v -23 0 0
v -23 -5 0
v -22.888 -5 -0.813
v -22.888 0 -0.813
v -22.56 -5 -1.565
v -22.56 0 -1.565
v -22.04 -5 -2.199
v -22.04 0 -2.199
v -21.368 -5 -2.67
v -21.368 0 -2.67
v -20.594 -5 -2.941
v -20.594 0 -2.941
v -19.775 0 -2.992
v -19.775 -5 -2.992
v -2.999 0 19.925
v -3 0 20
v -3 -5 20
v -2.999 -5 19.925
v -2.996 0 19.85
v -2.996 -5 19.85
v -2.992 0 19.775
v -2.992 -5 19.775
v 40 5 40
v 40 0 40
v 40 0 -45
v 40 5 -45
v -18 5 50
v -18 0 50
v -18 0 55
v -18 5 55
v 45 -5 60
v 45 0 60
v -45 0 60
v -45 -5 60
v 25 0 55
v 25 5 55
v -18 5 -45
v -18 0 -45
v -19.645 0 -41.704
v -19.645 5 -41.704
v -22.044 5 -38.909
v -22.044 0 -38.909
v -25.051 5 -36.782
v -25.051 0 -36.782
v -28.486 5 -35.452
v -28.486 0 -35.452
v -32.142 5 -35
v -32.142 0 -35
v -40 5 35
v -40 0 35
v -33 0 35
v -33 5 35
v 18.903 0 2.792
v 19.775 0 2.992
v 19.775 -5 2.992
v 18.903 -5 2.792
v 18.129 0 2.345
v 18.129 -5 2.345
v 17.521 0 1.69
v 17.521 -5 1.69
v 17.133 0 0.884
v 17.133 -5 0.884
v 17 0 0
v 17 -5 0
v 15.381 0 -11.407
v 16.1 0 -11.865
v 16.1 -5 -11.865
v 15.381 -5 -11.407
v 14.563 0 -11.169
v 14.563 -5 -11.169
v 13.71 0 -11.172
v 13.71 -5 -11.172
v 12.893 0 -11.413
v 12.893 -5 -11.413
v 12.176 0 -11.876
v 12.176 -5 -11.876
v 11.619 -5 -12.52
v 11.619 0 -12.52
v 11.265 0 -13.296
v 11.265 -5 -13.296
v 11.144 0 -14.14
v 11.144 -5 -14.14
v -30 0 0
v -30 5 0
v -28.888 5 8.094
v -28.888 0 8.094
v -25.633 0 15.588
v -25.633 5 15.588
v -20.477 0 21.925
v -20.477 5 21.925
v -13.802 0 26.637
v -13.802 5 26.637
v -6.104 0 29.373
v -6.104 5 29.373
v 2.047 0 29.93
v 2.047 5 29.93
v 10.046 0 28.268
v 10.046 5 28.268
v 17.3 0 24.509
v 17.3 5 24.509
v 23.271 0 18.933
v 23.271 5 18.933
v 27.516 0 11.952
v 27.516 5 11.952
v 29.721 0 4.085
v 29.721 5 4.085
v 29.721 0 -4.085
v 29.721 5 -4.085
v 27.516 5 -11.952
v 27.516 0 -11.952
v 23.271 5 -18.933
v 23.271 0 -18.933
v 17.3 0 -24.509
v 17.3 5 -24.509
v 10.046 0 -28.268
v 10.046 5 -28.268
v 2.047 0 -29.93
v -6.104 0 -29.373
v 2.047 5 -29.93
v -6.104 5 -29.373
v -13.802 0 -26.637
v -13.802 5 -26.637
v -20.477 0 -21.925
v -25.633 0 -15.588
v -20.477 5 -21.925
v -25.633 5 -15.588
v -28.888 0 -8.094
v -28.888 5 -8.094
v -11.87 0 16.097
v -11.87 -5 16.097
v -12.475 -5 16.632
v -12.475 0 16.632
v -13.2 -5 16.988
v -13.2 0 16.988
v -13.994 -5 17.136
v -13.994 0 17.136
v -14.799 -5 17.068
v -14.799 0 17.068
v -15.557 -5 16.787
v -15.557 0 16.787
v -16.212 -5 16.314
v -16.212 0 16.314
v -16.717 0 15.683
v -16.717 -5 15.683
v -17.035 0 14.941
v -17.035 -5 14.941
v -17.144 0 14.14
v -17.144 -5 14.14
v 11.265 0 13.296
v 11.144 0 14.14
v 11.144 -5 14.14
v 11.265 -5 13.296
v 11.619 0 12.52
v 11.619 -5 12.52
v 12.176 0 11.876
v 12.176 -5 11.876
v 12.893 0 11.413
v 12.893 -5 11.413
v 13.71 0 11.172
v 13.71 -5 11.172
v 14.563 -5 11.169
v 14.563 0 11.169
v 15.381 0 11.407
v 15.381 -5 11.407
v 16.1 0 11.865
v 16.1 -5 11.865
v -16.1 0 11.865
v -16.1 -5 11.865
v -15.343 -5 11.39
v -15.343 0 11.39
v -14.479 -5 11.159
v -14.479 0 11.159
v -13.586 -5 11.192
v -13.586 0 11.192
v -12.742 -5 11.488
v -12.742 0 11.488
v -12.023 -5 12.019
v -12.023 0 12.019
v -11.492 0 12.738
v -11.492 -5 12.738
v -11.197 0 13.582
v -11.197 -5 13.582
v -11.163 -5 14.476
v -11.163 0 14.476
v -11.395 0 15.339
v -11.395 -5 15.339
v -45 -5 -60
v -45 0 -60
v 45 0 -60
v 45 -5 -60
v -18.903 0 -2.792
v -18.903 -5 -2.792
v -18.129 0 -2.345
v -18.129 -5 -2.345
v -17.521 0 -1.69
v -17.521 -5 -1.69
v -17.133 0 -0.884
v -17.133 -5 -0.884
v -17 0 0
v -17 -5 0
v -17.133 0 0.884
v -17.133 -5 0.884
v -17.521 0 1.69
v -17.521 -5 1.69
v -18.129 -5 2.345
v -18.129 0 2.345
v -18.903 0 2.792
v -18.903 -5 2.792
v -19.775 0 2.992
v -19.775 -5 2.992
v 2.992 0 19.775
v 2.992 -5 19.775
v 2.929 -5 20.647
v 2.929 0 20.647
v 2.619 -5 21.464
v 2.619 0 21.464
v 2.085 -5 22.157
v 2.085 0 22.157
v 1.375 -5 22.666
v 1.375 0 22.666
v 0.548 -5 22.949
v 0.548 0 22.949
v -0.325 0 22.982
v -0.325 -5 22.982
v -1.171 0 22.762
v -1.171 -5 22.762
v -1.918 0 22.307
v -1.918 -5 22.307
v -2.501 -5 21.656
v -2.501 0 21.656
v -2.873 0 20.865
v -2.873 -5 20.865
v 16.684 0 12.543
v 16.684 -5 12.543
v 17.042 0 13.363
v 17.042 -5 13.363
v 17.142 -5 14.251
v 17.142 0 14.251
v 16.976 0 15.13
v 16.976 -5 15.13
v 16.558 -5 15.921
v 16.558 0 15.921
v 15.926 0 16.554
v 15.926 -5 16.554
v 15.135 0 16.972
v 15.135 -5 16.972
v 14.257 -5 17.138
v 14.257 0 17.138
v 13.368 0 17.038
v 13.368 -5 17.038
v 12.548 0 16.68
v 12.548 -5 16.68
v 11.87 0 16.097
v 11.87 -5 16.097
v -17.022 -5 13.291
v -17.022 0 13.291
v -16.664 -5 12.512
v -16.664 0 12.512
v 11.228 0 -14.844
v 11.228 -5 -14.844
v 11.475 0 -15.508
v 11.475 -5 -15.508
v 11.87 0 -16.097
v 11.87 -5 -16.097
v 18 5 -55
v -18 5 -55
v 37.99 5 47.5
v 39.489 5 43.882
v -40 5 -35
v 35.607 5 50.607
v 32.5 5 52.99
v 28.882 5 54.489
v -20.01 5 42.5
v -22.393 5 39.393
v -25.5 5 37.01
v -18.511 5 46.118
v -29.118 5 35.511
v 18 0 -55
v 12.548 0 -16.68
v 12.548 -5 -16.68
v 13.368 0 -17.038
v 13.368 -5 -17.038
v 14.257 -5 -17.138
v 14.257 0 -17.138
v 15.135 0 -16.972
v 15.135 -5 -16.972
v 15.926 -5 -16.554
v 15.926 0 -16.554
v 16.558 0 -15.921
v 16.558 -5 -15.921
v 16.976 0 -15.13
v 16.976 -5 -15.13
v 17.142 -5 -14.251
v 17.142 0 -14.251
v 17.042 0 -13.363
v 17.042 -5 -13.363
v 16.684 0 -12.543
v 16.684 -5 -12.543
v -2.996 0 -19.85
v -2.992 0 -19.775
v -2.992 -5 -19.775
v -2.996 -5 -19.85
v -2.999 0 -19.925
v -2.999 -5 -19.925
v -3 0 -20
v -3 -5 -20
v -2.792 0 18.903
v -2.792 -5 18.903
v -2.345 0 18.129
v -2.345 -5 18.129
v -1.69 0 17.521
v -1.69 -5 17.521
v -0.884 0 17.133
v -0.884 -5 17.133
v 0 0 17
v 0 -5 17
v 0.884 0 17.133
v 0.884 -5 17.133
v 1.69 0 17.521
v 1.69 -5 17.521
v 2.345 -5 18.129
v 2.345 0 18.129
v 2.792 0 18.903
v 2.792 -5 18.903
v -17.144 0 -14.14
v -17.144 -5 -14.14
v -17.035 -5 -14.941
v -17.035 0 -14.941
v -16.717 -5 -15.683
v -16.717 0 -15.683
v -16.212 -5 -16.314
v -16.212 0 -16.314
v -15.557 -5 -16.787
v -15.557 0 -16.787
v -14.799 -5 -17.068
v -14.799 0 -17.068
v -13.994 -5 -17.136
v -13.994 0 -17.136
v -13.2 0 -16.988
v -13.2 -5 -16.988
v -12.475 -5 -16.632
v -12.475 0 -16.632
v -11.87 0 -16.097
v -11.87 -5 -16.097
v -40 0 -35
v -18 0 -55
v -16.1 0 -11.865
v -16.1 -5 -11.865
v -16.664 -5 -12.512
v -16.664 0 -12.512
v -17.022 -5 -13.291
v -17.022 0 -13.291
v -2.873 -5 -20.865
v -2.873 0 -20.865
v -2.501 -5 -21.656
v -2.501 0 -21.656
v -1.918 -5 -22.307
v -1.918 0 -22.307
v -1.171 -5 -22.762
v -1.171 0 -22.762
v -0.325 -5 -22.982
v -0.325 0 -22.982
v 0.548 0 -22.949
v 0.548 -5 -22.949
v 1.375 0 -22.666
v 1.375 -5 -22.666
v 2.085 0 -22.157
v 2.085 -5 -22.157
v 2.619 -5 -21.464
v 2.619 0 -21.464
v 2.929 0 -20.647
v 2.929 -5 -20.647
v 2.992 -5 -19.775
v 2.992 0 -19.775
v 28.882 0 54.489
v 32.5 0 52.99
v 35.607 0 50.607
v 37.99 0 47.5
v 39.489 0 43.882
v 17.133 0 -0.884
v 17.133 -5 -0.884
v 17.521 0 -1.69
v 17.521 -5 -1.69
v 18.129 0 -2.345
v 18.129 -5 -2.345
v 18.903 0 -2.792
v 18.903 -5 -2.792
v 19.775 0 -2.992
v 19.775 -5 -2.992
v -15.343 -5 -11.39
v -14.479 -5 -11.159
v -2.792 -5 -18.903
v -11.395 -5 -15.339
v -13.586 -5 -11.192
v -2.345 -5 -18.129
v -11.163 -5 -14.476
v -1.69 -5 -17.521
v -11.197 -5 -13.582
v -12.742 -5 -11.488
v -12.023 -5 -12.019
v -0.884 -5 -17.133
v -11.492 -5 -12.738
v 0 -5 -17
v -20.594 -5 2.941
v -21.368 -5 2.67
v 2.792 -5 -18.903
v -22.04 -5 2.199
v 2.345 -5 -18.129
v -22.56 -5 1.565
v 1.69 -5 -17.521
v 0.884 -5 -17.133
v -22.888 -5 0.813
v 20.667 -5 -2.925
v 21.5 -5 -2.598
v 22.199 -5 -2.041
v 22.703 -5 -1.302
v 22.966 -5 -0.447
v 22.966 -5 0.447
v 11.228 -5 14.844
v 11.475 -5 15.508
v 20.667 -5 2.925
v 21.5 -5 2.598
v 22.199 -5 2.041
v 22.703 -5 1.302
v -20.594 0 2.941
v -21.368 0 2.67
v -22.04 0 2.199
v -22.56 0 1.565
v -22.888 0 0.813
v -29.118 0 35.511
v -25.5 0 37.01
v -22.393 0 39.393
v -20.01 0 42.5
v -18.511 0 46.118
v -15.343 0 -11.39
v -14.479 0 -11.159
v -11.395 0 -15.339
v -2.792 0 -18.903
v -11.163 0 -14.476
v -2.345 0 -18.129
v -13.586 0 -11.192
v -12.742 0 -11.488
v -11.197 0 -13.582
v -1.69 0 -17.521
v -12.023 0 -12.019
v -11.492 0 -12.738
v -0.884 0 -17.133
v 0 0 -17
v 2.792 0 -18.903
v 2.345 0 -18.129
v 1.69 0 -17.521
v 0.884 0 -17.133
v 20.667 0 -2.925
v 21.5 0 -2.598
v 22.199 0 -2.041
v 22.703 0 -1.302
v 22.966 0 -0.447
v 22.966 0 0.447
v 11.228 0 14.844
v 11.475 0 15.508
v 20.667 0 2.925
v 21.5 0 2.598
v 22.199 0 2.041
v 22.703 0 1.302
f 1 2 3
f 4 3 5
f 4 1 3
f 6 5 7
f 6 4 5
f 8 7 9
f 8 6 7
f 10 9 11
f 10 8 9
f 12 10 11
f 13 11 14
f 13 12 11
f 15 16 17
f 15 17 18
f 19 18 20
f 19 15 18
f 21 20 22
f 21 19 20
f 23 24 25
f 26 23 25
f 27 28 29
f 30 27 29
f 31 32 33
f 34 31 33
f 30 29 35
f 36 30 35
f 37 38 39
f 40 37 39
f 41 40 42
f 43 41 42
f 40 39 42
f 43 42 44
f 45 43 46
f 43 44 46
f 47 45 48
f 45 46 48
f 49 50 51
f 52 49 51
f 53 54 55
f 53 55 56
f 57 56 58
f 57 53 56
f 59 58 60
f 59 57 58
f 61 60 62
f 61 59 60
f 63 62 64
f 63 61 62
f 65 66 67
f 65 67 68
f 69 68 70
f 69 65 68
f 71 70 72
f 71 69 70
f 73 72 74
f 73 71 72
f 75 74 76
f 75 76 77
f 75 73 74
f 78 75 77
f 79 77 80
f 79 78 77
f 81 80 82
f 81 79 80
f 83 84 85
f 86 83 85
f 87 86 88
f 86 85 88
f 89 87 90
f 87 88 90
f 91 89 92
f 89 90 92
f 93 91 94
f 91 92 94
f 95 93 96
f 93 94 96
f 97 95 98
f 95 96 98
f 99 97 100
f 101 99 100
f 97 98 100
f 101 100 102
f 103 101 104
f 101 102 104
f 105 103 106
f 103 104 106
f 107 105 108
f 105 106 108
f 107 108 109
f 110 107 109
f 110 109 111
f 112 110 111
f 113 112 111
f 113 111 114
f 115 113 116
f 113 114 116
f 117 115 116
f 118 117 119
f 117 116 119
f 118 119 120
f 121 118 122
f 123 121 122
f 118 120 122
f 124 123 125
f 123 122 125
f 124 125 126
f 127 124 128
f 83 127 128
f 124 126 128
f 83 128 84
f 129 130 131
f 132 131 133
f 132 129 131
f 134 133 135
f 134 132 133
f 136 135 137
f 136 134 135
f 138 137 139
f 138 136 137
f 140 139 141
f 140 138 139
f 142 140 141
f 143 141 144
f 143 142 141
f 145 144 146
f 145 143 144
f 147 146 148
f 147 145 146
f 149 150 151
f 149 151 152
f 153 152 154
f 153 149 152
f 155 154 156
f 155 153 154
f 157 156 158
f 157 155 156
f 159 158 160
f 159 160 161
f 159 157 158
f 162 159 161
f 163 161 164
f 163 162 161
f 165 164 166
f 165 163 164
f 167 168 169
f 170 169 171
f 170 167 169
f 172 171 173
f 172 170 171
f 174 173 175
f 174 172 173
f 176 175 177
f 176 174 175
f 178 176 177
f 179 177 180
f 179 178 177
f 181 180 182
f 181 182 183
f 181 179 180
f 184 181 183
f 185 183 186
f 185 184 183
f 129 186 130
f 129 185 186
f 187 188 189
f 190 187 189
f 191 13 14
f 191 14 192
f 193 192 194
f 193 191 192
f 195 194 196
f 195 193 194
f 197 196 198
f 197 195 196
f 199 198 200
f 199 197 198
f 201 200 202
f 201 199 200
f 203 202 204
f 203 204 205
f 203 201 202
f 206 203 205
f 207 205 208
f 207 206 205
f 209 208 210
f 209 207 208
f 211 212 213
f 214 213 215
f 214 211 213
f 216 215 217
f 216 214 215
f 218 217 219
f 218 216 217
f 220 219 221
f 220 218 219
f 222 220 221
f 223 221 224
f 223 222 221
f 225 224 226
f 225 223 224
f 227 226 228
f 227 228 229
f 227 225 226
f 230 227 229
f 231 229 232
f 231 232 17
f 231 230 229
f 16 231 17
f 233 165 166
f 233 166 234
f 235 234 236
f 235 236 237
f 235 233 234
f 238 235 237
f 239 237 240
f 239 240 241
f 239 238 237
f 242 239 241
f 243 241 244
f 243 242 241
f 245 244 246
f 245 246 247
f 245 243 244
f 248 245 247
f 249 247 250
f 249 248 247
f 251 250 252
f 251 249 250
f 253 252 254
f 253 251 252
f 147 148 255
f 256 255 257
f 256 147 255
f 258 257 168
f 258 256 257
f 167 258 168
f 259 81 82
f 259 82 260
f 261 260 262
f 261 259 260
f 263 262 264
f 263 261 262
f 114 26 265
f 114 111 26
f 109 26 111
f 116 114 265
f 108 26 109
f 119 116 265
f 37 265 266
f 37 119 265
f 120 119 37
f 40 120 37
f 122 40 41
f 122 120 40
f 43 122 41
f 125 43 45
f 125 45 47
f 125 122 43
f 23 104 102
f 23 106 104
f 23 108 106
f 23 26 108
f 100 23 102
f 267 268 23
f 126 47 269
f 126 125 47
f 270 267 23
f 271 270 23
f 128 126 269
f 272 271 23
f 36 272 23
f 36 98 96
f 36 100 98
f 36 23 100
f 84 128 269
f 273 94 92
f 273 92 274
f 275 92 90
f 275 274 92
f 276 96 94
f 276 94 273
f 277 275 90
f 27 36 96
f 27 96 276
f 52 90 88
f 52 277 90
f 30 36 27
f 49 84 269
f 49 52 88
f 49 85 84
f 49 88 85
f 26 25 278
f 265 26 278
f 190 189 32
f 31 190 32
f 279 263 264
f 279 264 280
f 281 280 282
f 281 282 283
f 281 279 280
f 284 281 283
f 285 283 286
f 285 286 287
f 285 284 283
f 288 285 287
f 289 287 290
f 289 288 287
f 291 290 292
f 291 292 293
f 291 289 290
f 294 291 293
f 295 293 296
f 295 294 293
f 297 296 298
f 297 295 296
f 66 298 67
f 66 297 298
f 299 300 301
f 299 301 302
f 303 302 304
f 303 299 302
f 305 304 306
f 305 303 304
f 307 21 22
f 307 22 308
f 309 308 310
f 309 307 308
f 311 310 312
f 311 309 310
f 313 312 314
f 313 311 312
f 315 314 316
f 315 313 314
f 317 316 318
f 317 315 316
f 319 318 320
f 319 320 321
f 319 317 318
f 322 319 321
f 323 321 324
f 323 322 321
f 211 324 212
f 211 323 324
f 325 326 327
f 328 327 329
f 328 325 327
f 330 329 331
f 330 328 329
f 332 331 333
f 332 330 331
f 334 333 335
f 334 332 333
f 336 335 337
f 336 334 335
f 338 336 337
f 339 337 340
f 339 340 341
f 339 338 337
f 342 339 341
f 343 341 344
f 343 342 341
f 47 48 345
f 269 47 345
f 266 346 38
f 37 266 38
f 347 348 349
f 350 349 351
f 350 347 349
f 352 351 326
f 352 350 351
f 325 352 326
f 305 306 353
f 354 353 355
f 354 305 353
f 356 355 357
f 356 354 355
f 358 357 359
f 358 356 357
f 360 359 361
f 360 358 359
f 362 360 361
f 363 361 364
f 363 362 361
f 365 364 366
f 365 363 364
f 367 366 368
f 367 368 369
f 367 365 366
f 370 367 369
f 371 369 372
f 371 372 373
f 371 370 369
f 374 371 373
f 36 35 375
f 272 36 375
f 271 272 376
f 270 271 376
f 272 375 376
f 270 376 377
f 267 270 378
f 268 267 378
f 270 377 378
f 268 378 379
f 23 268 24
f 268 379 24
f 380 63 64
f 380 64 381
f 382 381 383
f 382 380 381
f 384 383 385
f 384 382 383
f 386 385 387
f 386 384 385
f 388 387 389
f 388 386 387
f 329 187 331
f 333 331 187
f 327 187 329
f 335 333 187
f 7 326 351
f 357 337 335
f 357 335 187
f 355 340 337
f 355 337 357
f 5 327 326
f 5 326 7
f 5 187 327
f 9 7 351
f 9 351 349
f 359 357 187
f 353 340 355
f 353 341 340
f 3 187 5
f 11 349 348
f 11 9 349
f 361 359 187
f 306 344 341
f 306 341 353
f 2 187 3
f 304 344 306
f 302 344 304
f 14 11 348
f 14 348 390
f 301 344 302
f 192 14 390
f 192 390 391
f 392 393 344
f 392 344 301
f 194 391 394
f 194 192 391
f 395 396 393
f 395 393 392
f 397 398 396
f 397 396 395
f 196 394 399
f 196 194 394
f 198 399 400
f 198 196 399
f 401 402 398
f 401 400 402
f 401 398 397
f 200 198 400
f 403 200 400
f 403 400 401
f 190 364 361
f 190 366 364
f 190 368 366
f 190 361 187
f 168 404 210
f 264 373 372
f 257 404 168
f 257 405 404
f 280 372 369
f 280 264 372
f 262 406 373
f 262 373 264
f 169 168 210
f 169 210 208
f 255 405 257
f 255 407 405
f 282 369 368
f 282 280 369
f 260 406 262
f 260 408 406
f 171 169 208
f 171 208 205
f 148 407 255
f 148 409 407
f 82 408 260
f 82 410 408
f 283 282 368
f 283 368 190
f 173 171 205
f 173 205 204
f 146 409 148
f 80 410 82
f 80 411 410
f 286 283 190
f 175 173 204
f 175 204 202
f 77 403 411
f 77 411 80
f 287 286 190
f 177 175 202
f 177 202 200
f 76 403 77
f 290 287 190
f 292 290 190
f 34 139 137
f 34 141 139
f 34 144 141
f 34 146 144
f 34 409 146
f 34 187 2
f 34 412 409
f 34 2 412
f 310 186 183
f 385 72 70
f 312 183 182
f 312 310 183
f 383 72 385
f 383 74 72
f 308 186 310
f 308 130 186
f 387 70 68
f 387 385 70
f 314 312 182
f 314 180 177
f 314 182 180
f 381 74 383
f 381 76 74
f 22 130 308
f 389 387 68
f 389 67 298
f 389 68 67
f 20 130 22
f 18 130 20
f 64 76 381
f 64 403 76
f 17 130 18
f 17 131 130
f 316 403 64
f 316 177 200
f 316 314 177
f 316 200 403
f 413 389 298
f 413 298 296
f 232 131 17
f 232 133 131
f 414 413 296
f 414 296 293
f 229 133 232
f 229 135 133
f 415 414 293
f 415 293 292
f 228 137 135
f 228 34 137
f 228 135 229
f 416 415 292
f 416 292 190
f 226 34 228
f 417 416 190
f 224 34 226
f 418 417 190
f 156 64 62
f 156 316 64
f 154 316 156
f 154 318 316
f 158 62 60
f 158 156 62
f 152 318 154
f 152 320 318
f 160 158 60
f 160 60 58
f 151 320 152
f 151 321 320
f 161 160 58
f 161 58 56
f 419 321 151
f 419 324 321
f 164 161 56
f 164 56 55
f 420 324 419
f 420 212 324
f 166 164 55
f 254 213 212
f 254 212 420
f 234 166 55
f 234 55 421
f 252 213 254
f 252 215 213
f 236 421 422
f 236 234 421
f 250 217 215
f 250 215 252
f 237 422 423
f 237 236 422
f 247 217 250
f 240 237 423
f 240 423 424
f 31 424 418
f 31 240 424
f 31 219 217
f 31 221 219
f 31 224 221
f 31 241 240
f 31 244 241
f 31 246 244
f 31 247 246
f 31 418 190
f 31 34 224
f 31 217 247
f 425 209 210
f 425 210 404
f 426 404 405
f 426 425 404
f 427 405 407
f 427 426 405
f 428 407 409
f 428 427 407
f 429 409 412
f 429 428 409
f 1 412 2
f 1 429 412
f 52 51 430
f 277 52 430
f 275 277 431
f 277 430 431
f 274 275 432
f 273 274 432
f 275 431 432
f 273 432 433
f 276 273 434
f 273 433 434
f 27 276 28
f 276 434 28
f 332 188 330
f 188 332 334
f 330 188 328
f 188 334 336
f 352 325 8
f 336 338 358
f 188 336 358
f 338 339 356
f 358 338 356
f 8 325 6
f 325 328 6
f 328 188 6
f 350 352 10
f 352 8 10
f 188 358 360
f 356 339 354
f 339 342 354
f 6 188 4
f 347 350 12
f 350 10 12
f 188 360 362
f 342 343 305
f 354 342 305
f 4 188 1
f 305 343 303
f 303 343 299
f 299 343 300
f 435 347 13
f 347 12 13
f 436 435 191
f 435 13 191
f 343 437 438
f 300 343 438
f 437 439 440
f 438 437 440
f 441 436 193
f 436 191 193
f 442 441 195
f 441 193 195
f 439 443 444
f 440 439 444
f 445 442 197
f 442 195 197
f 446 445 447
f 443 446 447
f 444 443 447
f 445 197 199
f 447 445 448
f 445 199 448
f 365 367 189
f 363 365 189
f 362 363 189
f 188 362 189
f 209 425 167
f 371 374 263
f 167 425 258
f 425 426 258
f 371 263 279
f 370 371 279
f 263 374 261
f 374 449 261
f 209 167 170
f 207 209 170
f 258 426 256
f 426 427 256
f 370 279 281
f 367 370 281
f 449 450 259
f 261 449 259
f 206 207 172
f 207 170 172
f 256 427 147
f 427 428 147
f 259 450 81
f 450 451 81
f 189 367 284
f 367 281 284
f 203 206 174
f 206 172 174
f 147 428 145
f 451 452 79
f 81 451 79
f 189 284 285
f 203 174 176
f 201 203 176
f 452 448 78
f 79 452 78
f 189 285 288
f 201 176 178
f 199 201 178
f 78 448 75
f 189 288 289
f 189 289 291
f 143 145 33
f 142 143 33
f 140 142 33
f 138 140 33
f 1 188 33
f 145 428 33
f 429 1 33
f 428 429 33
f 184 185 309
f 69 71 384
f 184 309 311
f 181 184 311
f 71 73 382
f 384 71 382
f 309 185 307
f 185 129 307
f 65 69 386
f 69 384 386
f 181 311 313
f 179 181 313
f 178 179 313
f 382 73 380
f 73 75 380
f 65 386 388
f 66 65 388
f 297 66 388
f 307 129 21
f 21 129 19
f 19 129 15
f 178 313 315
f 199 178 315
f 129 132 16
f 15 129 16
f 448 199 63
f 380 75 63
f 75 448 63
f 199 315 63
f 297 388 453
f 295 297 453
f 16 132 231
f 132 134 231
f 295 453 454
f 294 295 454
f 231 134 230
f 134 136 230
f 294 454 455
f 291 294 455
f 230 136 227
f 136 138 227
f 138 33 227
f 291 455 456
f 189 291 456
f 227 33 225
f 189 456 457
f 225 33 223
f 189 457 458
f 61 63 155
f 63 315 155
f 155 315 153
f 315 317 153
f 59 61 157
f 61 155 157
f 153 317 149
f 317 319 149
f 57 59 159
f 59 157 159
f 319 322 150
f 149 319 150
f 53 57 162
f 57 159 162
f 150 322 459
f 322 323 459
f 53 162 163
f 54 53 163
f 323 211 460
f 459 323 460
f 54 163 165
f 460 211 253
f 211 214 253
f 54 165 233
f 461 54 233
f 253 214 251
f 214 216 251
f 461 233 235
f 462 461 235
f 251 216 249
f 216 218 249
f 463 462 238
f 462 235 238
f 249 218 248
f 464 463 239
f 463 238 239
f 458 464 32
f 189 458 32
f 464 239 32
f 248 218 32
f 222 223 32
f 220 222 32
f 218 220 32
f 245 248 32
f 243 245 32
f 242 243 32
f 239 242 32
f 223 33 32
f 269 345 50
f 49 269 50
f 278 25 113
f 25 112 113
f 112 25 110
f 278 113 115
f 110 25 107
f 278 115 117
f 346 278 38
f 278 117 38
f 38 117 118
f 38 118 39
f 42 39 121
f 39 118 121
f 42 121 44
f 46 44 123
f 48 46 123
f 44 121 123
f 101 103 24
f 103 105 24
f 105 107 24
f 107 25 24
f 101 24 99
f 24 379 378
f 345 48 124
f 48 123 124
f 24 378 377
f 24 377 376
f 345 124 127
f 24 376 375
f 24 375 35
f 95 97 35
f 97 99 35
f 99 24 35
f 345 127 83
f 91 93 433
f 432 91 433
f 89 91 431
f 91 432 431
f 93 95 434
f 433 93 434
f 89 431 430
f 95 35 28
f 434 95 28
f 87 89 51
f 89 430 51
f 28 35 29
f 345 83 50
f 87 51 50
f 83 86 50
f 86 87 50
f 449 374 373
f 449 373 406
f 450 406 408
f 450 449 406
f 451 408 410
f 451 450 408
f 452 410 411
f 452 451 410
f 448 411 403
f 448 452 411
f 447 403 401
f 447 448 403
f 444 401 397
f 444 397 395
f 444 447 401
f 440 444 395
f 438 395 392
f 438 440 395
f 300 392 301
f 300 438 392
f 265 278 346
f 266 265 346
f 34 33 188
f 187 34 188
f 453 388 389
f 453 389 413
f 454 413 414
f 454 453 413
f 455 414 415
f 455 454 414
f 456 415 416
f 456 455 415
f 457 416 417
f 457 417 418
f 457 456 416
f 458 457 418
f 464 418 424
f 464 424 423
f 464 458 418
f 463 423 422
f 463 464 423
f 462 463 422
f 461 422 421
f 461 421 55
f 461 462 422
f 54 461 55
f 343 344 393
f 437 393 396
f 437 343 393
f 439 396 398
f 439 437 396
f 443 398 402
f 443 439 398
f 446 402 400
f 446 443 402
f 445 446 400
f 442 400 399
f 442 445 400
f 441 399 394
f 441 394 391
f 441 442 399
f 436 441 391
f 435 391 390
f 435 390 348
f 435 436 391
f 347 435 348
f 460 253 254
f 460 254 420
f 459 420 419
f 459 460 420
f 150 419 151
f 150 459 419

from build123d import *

# Parameters (mm, degrees)
F1_DEPTH = 5
F3_DEPTH = 5
F4_R     = 30
F5_DEPTH = 5
F6_DEPTH = 10


# Not quite as in the source:
# - a feature names something its author has since deleted; it is built from what else it names


with BuildPart() as f1:
    # F0 (on Front) → F1 (new body)
    with BuildSketch(Plane.XZ):
        Polygon((45, 60), (-45, 60), (-45, 0), (-45, -60), (0, -60), (45, -60), align=None)
    extrude(amount=F1_DEPTH)


with BuildPart() as f3:
    # F2 (on face) → F3 (new body)
    with BuildSketch(Plane(origin=(0, 0, 0), x_dir=(-1, 0, 0), z_dir=(0, 1, 0))):
        with BuildLine():
            Line((-40, -45), (-18, -55))
            Line((-18, -55), (18, -55))
            Line((18, -55), (18, -45))
            ThreePointArc((18, -45), (23.4818815859, -37.7525512861), (32.1421356237, -35))
            Line((32.1421356237, -35), (40, -35))
            Line((40, -35), (40, 35))
            Line((40, 35), (33, 35))
            ThreePointArc((33, 35), (22.3933982822, 39.3933982822), (18, 50))
            Line((18, 50), (18, 55))
            Line((18, 55), (-25, 55))
            ThreePointArc((-25, 55), (-35.6066017178, 50.6066017178), (-40, 40))
            Line((-40, 40), (-40, -45))
        make_face()
    extrude(amount=F3_DEPTH)

    # F4 (on face) → F5 (cut)
    with BuildSketch(Plane(origin=(0, 5, 0), x_dir=(-1, 0, 0), z_dir=(0, 1, 0))):
        Circle(F4_R)
        with BuildLine():
            ThreePointArc((16.1001741522, 11.8652598905), (18.4781684496, 7.6522735674), (19.775, 2.9915506013))
            ThreePointArc((19.775, 2.9915506013), (22.0402205763, 2.1994317448), (23, 0))
            ThreePointArc((23, 0), (22.0402205763, -2.1994317448), (19.775, -2.9915506013))
            ThreePointArc((19.775, -2.9915506013), (18.4781684496, -7.6522735674), (16.1001741522, -11.8652598905))
            ThreePointArc((16.1001741522, -11.8652598905), (16.8707805694, -12.8885427857), (17.144270925, -14.14))
            ThreePointArc((17.144270925, -14.14), (15.187715229, -16.9526898131), (11.870121602, -16.0965901095))
            ThreePointArc((11.870121602, -16.0965901095), (7.6550636836, -18.4770127456), (2.9915506013, -19.775))
            ThreePointArc((2.9915506013, -19.775), (2.9978869061, -19.8874207031), (3, -20))
            ThreePointArc((3, -20), (-0.1125792969, -22.9978869061), (-2.9915506013, -19.775))
            ThreePointArc((-2.9915506013, -19.775), (-7.6550636836, -18.4770127456), (-11.870121602, -16.0965901095))
            ThreePointArc((-11.870121602, -16.0965901095), (-16.2659115638, -16.261), (-16.1001741522, -11.8652598905))
            ThreePointArc((-16.1001741522, -11.8652598905), (-18.4781684496, -7.6522735674), (-19.775, -2.9915506013))
            ThreePointArc((-19.775, -2.9915506013), (-23, 0), (-19.775, 2.9915506013))
            ThreePointArc((-19.775, 2.9915506013), (-18.4781684496, 7.6522735674), (-16.1001741522, 11.8652598905))
            ThreePointArc((-16.1001741522, 11.8652598905), (-16.2659115638, 16.261), (-11.870121602, 16.0965901095))
            ThreePointArc((-11.870121602, 16.0965901095), (-7.6550636836, 18.4770127456), (-2.9915506013, 19.775))
            ThreePointArc((-2.9915506013, 19.775), (-0.1125792969, 22.9978869061), (3, 20))
            ThreePointArc((3, 20), (2.9978869061, 19.8874207031), (2.9915506013, 19.775))
            ThreePointArc((2.9915506013, 19.775), (7.6550636836, 18.4770127456), (11.870121602, 16.0965901095))
            ThreePointArc((11.870121602, 16.0965901095), (15.187715229, 16.9526898131), (17.144270925, 14.14))
            ThreePointArc((17.144270925, 14.14), (16.8707805694, 12.8885427857), (16.1001741522, 11.8652598905))
        make_face(mode=Mode.SUBTRACT)
        with BuildLine():
            ThreePointArc((19.775, -2.9915506013), (17, 0), (19.775, 2.9915506013))
            ThreePointArc((19.775, 2.9915506013), (18.4781684496, 7.6522735674), (16.1001741522, 11.8652598905))
            ThreePointArc((16.1001741522, 11.8652598905), (12.0226302863, 12.019), (11.870121602, 16.0965901095))
            ThreePointArc((11.870121602, 16.0965901095), (7.6550636836, 18.4770127456), (2.9915506013, 19.775))
            ThreePointArc((2.9915506013, 19.775), (0, 17), (-2.9915506013, 19.775))
            ThreePointArc((-2.9915506013, 19.775), (-7.6550636836, 18.4770127456), (-11.870121602, 16.0965901095))
            ThreePointArc((-11.870121602, 16.0965901095), (-11.3315811119, 15.183444304), (-11.144270925, 14.14))
            ThreePointArc((-11.144270925, 14.14), (-12.8928137107, 11.4134903556), (-16.1001741522, 11.8652598905))
            ThreePointArc((-16.1001741522, 11.8652598905), (-18.4781684496, 7.6522735674), (-19.775, 2.9915506013))
            ThreePointArc((-19.775, 2.9915506013), (-17.8005682552, 2.0402205763), (-17, 0))
            ThreePointArc((-17, 0), (-17.8005682552, -2.0402205763), (-19.775, -2.9915506013))
            ThreePointArc((-19.775, -2.9915506013), (-18.4781684496, -7.6522735674), (-16.1001741522, -11.8652598905))
            ThreePointArc((-16.1001741522, -11.8652598905), (-12.8928137107, -11.4134903556), (-11.144270925, -14.14))
            ThreePointArc((-11.144270925, -14.14), (-11.3315811119, -15.183444304), (-11.870121602, -16.0965901095))
            ThreePointArc((-11.870121602, -16.0965901095), (-7.6550636836, -18.4770127456), (-2.9915506013, -19.775))
            ThreePointArc((-2.9915506013, -19.775), (0, -17), (2.9915506013, -19.775))
            ThreePointArc((2.9915506013, -19.775), (7.6550636836, -18.4770127456), (11.870121602, -16.0965901095))
            ThreePointArc((11.870121602, -16.0965901095), (12.0226302863, -12.019), (16.1001741522, -11.8652598905))
            ThreePointArc((16.1001741522, -11.8652598905), (18.4781684496, -7.6522735674), (19.775, -2.9915506013))
        make_face()
    extrude(amount=-F5_DEPTH, mode=Mode.SUBTRACT)


with BuildPart() as f6_tool:
    # F6 (cut): faces of the model
    f6_faces = [f3.part.faces().sort_by_distance(p)[0] for p in [
        (14.144270925, 5, -14.14),
        (20, 5, 0),
        (0, 5, 20),
        (14.144270925, 5, 14.14),
        (-14.144270925, 5, 14.14),
        (-20, 5, 0),
        (-14.144270925, 5, -14.14),
        (0, 5, -20),
    ]]
    extrude(f6_faces, amount=-F6_DEPTH)


with BuildPart() as f1_1:
    add(f1.part)

    # F6: cut by f6_tool
    add(f6_tool.part, mode=Mode.SUBTRACT)


with BuildPart() as f3_1:
    add(f3.part)

    # F6: cut by f6_tool
    add(f6_tool.part, mode=Mode.SUBTRACT)


solid = Compound([f1_1.part, f3_1.part])
